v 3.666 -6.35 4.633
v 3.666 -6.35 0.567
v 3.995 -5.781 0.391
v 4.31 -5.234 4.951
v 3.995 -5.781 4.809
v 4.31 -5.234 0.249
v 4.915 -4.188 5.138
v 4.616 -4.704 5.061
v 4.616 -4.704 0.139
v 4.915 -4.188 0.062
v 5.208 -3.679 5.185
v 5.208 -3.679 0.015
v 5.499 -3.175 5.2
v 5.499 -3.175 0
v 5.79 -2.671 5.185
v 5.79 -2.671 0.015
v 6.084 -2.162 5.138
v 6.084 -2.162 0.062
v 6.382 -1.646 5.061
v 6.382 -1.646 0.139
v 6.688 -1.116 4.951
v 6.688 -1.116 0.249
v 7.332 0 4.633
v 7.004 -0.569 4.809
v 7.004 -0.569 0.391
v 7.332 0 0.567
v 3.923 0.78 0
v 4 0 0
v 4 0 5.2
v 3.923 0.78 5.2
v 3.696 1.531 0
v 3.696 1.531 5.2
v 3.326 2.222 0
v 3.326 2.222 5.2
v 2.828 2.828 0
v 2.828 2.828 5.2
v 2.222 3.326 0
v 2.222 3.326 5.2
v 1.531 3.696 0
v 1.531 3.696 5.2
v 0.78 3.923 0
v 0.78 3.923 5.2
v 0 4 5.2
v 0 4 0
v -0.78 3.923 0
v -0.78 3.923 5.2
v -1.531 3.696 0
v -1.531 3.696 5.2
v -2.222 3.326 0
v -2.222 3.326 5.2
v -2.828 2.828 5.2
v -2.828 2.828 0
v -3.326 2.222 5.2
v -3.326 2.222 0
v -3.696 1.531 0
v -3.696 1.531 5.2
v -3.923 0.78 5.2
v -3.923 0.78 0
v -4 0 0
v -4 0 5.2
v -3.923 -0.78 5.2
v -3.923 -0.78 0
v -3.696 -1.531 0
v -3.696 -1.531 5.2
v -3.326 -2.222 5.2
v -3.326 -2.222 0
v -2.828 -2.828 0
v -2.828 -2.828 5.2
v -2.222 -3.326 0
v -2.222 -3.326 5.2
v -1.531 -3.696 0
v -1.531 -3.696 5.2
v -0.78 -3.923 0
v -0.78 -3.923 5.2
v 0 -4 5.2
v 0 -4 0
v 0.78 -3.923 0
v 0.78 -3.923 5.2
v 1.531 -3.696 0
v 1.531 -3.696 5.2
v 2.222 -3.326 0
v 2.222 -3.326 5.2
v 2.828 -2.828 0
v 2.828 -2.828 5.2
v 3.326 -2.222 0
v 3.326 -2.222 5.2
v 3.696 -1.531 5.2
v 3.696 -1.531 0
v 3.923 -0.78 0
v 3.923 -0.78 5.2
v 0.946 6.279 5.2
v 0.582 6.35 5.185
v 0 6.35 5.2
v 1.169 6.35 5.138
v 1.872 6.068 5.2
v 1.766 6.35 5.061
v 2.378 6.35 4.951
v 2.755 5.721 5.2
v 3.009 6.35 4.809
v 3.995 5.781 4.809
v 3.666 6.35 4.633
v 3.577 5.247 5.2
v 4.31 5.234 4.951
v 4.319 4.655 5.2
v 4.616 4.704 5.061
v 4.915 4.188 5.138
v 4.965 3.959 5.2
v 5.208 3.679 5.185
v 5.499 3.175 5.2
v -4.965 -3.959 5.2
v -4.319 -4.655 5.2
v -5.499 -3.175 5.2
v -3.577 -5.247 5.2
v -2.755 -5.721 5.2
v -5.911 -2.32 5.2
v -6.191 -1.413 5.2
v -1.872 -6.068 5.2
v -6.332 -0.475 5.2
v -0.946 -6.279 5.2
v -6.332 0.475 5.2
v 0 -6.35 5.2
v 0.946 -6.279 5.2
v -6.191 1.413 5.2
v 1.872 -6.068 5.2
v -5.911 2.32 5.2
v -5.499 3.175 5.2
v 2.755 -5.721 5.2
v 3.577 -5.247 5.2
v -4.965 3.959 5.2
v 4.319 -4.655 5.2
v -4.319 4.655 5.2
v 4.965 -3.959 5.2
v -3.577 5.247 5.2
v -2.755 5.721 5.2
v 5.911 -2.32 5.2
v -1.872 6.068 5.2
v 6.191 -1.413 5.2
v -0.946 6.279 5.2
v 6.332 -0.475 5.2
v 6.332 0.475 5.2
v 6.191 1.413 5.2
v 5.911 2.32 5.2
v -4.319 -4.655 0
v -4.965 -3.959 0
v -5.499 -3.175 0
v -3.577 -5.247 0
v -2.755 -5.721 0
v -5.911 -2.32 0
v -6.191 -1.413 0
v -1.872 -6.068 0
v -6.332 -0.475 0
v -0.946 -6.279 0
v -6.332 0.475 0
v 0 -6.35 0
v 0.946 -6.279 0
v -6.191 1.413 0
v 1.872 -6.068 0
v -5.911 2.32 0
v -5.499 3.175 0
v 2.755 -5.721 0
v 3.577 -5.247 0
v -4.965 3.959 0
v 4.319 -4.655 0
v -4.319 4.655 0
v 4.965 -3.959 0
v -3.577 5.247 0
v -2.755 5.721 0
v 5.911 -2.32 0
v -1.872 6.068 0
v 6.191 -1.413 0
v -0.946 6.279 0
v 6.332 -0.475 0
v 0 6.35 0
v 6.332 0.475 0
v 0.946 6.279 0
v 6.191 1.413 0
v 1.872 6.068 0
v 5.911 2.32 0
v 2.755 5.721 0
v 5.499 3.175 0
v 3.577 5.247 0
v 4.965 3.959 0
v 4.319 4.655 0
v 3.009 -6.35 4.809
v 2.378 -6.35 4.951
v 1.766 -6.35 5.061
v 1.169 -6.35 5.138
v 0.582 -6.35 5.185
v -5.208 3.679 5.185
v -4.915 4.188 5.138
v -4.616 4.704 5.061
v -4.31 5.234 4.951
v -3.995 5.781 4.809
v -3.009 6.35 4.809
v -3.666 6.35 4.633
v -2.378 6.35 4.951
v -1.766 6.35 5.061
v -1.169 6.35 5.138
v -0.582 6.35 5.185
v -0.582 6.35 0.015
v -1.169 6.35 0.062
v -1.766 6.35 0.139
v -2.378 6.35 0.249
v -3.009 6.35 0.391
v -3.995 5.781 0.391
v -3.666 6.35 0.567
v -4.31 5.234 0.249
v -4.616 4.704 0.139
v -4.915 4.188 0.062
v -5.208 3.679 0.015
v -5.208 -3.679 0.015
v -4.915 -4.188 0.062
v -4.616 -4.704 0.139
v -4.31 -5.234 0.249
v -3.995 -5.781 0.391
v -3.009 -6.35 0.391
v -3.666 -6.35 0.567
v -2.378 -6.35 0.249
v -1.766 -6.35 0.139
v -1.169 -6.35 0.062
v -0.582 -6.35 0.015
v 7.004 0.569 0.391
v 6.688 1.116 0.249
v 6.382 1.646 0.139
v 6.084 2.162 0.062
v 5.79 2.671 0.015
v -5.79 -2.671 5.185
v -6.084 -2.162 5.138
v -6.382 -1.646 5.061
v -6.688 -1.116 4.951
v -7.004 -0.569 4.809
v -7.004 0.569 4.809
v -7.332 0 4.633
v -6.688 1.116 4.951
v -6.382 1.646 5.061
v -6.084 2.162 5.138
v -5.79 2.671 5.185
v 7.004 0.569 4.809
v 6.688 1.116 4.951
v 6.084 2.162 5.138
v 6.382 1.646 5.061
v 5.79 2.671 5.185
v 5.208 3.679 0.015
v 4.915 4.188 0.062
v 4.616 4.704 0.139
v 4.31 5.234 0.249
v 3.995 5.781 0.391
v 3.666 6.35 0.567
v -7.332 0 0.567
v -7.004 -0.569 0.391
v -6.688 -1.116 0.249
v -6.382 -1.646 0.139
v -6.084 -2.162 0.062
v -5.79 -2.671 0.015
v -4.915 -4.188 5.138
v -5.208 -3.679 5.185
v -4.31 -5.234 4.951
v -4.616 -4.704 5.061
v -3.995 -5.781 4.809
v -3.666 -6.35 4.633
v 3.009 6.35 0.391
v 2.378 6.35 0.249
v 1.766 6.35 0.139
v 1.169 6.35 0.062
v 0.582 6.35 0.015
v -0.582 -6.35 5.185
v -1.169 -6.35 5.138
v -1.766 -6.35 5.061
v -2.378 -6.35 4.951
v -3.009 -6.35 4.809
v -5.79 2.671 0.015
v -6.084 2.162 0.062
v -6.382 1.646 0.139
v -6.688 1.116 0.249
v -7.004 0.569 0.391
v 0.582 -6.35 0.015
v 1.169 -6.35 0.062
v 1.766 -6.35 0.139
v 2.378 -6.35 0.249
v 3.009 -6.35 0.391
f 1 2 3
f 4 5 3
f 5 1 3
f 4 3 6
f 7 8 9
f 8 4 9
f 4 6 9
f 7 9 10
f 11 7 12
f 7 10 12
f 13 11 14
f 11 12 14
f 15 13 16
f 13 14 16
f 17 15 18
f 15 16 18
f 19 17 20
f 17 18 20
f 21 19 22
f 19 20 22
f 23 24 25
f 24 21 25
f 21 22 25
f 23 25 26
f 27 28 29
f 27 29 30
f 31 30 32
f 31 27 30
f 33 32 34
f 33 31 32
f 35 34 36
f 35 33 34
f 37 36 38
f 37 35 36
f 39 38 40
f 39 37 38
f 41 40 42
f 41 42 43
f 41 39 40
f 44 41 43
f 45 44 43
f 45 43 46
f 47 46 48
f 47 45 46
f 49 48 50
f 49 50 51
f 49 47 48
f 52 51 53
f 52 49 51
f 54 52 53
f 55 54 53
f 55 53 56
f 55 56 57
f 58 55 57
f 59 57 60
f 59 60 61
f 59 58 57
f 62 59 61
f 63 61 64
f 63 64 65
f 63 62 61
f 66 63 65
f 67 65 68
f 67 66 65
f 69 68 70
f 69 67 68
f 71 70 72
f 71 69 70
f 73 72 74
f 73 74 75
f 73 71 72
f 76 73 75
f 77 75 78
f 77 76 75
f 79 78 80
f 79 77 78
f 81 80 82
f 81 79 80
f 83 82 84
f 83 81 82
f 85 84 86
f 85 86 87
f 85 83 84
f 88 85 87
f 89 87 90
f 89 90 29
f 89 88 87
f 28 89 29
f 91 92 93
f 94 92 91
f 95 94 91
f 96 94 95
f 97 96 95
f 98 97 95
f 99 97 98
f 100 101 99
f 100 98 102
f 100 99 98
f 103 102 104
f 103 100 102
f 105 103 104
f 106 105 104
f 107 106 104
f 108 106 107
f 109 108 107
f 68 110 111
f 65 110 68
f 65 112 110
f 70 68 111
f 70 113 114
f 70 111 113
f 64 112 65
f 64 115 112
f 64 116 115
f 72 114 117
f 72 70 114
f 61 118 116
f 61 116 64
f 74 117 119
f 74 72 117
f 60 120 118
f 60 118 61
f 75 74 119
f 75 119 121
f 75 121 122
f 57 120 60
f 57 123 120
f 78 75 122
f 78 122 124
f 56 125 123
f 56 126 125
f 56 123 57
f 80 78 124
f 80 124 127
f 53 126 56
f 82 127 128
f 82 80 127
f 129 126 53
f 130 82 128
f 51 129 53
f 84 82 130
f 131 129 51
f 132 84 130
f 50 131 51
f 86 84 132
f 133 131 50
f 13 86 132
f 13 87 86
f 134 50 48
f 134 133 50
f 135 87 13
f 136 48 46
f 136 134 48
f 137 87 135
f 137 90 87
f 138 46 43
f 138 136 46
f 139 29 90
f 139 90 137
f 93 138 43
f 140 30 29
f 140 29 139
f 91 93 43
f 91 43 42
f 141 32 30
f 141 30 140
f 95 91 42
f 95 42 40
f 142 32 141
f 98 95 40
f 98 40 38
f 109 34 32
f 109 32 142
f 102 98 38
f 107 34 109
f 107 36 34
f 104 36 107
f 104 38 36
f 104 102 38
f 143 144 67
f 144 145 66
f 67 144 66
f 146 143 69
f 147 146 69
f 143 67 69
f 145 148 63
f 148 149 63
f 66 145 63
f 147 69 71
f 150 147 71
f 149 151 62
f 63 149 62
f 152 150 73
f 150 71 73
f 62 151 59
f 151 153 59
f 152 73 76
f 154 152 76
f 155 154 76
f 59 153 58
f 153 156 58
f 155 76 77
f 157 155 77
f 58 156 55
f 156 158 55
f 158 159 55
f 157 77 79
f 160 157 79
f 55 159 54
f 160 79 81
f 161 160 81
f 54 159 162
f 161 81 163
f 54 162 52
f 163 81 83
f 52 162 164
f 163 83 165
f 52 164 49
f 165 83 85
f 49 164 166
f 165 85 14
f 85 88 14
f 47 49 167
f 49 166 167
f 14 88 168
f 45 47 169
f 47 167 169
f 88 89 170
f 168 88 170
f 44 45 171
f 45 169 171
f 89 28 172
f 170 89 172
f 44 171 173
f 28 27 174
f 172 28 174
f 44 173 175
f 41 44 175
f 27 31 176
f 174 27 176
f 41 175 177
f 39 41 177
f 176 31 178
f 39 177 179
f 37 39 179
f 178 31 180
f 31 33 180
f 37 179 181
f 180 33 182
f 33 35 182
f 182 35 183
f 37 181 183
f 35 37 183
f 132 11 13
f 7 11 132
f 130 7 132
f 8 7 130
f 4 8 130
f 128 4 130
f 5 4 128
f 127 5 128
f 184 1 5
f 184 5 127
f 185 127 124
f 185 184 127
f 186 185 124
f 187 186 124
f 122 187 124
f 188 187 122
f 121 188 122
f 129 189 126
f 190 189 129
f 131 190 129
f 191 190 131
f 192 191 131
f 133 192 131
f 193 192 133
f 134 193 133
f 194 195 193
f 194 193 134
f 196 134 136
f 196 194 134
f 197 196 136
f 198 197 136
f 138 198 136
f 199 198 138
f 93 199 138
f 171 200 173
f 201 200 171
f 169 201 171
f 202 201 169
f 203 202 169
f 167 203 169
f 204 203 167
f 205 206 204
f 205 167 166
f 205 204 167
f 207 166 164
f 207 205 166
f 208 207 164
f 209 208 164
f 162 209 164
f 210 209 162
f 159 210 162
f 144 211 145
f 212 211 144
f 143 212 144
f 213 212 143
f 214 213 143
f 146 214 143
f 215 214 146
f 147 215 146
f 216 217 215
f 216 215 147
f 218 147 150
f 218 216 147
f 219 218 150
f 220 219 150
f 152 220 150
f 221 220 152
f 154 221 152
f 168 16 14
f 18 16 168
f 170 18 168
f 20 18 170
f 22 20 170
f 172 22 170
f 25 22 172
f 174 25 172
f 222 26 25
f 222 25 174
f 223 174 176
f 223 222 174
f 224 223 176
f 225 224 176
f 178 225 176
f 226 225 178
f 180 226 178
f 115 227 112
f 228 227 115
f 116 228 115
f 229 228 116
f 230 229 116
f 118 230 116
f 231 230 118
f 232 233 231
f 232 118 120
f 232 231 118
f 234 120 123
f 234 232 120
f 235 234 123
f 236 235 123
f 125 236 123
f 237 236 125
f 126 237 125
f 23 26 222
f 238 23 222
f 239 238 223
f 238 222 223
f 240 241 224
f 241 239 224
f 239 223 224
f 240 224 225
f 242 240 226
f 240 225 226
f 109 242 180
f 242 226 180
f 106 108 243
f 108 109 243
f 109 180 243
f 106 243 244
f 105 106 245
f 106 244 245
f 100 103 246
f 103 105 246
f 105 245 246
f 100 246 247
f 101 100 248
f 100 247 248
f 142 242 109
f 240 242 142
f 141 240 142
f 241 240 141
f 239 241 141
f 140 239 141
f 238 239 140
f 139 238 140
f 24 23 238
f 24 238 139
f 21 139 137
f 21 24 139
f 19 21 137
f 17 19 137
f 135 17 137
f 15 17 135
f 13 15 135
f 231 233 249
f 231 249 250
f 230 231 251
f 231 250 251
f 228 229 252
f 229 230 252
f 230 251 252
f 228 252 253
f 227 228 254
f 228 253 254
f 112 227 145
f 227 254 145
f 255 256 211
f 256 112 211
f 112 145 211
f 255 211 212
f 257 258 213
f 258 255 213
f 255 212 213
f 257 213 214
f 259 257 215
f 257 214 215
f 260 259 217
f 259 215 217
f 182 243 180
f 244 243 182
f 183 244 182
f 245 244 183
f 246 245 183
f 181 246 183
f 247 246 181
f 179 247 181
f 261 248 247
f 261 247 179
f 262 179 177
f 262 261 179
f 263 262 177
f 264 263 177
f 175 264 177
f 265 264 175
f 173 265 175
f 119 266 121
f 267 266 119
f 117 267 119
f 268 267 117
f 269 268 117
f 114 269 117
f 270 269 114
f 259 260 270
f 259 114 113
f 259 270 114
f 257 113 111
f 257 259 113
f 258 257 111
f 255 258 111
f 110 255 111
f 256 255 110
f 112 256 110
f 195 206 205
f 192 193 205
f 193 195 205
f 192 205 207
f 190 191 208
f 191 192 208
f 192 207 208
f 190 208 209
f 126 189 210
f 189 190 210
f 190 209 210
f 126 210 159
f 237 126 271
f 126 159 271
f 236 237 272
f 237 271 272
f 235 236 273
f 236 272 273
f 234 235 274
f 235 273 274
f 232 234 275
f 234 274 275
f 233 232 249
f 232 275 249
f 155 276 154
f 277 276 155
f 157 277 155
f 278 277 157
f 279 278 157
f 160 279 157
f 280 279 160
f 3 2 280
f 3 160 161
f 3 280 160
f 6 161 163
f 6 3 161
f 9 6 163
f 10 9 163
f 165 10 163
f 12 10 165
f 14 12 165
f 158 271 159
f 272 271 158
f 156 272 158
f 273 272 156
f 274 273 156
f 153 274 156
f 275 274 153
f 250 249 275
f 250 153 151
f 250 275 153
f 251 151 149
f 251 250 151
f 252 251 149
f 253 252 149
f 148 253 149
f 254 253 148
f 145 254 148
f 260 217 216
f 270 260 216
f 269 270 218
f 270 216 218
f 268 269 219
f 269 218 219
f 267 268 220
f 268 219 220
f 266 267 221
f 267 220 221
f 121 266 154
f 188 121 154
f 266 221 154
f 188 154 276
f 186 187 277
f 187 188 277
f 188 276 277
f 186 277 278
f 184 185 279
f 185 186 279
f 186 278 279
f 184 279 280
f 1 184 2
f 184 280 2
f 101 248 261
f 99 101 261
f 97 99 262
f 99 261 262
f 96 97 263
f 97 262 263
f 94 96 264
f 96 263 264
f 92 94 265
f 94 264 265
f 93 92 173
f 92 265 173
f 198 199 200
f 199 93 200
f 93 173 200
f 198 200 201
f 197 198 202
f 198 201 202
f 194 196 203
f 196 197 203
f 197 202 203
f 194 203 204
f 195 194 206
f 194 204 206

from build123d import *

# Parameters (mm, degrees)
SKETCH1_R           = 4
BOSS_EXTRUDE1_DEPTH = 5.2
SKETCH2_OUTSIDE_W   = 38.002
SKETCH2_OUTSIDE_H   = 36.038
SKETCH2_OUTSIDE_R   = 6.35
CUT_EXTRUDE1_DEPTH  = 5
CUT_EXTRUDE1_DRAFT  = -60
SKETCH3_OUTSIDE_W   = 38.002
SKETCH3_OUTSIDE_H   = 36.038
SKETCH3_OUTSIDE_R   = 6.35
CUT_EXTRUDE2_DEPTH  = 5
CUT_EXTRUDE2_DRAFT  = -60


with BuildPart() as part:
    # Sketch1 → Boss-Extrude1 (new body)
    with BuildSketch(Plane.XY):
        Polygon((7.332348419, 0), (3.666174209, 6.35), (-3.666174209, 6.35), (-7.332348419, 0), (-3.666174209, -6.35), (3.666174209, -6.35), align=None)
        Circle(SKETCH1_R, mode=Mode.SUBTRACT)
    extrude(amount=BOSS_EXTRUDE1_DEPTH)


with BuildPart() as cut_extrude1_tool:
    # Sketch2 outside → Cut-Extrude1 (with draft: the straight prism first)
    with BuildSketch(Plane.XY.offset(5.2)):
        Rectangle(SKETCH2_OUTSIDE_W, SKETCH2_OUTSIDE_H)
        Circle(SKETCH2_OUTSIDE_R, mode=Mode.SUBTRACT)
    extrude(amount=-CUT_EXTRUDE1_DEPTH)
    # Cut-Extrude1: the draft: its side faces are tilted about the plane it starts from
    cut_extrude1_sides = [cut_extrude1_tool.faces().sort_by_distance(p)[0] for p in [
        (0, -18.019, 2.7),
        (19.001, 0, 2.7),
        (0, 18.019, 2.7),
        (-19.001, 0, 2.7),
        (-6.35, 0, 2.7),
    ]]
    draft(cut_extrude1_sides, Plane.XY.offset(5.2), CUT_EXTRUDE1_DRAFT)


with BuildPart() as part_1:
    add(part.part)

    # Cut-Extrude1: cut by cut_extrude1_tool
    add(cut_extrude1_tool.part, mode=Mode.SUBTRACT)


with BuildPart() as cut_extrude2_tool:
    # Sketch3 outside → Cut-Extrude2 (with draft: the straight prism first)
    with BuildSketch(Plane(origin=(0, 0, 0), x_dir=(-1, 0, 0), z_dir=(0, 0, -1))):
        Rectangle(SKETCH3_OUTSIDE_W, SKETCH3_OUTSIDE_H)
        Circle(SKETCH3_OUTSIDE_R, mode=Mode.SUBTRACT)
    extrude(amount=-CUT_EXTRUDE2_DEPTH)
    # Cut-Extrude2: the draft: its side faces are tilted about the plane it starts from
    cut_extrude2_sides = [cut_extrude2_tool.faces().sort_by_distance(p)[0] for p in [
        (0, -18.019, 2.5),
        (-19.001, 0, 2.5),
        (0, 18.019, 2.5),
        (19.001, 0, 2.5),
        (6.35, 0, 2.5),
    ]]
    draft(cut_extrude2_sides, Plane(origin=(0, 0, 0), x_dir=(-1, 0, 0), z_dir=(0, 0, -1)), CUT_EXTRUDE2_DRAFT)


with BuildPart() as part_2:
    add(part_1.part)

    # Cut-Extrude2: cut by cut_extrude2_tool
    add(cut_extrude2_tool.part, mode=Mode.SUBTRACT)


solid = part_2.part
